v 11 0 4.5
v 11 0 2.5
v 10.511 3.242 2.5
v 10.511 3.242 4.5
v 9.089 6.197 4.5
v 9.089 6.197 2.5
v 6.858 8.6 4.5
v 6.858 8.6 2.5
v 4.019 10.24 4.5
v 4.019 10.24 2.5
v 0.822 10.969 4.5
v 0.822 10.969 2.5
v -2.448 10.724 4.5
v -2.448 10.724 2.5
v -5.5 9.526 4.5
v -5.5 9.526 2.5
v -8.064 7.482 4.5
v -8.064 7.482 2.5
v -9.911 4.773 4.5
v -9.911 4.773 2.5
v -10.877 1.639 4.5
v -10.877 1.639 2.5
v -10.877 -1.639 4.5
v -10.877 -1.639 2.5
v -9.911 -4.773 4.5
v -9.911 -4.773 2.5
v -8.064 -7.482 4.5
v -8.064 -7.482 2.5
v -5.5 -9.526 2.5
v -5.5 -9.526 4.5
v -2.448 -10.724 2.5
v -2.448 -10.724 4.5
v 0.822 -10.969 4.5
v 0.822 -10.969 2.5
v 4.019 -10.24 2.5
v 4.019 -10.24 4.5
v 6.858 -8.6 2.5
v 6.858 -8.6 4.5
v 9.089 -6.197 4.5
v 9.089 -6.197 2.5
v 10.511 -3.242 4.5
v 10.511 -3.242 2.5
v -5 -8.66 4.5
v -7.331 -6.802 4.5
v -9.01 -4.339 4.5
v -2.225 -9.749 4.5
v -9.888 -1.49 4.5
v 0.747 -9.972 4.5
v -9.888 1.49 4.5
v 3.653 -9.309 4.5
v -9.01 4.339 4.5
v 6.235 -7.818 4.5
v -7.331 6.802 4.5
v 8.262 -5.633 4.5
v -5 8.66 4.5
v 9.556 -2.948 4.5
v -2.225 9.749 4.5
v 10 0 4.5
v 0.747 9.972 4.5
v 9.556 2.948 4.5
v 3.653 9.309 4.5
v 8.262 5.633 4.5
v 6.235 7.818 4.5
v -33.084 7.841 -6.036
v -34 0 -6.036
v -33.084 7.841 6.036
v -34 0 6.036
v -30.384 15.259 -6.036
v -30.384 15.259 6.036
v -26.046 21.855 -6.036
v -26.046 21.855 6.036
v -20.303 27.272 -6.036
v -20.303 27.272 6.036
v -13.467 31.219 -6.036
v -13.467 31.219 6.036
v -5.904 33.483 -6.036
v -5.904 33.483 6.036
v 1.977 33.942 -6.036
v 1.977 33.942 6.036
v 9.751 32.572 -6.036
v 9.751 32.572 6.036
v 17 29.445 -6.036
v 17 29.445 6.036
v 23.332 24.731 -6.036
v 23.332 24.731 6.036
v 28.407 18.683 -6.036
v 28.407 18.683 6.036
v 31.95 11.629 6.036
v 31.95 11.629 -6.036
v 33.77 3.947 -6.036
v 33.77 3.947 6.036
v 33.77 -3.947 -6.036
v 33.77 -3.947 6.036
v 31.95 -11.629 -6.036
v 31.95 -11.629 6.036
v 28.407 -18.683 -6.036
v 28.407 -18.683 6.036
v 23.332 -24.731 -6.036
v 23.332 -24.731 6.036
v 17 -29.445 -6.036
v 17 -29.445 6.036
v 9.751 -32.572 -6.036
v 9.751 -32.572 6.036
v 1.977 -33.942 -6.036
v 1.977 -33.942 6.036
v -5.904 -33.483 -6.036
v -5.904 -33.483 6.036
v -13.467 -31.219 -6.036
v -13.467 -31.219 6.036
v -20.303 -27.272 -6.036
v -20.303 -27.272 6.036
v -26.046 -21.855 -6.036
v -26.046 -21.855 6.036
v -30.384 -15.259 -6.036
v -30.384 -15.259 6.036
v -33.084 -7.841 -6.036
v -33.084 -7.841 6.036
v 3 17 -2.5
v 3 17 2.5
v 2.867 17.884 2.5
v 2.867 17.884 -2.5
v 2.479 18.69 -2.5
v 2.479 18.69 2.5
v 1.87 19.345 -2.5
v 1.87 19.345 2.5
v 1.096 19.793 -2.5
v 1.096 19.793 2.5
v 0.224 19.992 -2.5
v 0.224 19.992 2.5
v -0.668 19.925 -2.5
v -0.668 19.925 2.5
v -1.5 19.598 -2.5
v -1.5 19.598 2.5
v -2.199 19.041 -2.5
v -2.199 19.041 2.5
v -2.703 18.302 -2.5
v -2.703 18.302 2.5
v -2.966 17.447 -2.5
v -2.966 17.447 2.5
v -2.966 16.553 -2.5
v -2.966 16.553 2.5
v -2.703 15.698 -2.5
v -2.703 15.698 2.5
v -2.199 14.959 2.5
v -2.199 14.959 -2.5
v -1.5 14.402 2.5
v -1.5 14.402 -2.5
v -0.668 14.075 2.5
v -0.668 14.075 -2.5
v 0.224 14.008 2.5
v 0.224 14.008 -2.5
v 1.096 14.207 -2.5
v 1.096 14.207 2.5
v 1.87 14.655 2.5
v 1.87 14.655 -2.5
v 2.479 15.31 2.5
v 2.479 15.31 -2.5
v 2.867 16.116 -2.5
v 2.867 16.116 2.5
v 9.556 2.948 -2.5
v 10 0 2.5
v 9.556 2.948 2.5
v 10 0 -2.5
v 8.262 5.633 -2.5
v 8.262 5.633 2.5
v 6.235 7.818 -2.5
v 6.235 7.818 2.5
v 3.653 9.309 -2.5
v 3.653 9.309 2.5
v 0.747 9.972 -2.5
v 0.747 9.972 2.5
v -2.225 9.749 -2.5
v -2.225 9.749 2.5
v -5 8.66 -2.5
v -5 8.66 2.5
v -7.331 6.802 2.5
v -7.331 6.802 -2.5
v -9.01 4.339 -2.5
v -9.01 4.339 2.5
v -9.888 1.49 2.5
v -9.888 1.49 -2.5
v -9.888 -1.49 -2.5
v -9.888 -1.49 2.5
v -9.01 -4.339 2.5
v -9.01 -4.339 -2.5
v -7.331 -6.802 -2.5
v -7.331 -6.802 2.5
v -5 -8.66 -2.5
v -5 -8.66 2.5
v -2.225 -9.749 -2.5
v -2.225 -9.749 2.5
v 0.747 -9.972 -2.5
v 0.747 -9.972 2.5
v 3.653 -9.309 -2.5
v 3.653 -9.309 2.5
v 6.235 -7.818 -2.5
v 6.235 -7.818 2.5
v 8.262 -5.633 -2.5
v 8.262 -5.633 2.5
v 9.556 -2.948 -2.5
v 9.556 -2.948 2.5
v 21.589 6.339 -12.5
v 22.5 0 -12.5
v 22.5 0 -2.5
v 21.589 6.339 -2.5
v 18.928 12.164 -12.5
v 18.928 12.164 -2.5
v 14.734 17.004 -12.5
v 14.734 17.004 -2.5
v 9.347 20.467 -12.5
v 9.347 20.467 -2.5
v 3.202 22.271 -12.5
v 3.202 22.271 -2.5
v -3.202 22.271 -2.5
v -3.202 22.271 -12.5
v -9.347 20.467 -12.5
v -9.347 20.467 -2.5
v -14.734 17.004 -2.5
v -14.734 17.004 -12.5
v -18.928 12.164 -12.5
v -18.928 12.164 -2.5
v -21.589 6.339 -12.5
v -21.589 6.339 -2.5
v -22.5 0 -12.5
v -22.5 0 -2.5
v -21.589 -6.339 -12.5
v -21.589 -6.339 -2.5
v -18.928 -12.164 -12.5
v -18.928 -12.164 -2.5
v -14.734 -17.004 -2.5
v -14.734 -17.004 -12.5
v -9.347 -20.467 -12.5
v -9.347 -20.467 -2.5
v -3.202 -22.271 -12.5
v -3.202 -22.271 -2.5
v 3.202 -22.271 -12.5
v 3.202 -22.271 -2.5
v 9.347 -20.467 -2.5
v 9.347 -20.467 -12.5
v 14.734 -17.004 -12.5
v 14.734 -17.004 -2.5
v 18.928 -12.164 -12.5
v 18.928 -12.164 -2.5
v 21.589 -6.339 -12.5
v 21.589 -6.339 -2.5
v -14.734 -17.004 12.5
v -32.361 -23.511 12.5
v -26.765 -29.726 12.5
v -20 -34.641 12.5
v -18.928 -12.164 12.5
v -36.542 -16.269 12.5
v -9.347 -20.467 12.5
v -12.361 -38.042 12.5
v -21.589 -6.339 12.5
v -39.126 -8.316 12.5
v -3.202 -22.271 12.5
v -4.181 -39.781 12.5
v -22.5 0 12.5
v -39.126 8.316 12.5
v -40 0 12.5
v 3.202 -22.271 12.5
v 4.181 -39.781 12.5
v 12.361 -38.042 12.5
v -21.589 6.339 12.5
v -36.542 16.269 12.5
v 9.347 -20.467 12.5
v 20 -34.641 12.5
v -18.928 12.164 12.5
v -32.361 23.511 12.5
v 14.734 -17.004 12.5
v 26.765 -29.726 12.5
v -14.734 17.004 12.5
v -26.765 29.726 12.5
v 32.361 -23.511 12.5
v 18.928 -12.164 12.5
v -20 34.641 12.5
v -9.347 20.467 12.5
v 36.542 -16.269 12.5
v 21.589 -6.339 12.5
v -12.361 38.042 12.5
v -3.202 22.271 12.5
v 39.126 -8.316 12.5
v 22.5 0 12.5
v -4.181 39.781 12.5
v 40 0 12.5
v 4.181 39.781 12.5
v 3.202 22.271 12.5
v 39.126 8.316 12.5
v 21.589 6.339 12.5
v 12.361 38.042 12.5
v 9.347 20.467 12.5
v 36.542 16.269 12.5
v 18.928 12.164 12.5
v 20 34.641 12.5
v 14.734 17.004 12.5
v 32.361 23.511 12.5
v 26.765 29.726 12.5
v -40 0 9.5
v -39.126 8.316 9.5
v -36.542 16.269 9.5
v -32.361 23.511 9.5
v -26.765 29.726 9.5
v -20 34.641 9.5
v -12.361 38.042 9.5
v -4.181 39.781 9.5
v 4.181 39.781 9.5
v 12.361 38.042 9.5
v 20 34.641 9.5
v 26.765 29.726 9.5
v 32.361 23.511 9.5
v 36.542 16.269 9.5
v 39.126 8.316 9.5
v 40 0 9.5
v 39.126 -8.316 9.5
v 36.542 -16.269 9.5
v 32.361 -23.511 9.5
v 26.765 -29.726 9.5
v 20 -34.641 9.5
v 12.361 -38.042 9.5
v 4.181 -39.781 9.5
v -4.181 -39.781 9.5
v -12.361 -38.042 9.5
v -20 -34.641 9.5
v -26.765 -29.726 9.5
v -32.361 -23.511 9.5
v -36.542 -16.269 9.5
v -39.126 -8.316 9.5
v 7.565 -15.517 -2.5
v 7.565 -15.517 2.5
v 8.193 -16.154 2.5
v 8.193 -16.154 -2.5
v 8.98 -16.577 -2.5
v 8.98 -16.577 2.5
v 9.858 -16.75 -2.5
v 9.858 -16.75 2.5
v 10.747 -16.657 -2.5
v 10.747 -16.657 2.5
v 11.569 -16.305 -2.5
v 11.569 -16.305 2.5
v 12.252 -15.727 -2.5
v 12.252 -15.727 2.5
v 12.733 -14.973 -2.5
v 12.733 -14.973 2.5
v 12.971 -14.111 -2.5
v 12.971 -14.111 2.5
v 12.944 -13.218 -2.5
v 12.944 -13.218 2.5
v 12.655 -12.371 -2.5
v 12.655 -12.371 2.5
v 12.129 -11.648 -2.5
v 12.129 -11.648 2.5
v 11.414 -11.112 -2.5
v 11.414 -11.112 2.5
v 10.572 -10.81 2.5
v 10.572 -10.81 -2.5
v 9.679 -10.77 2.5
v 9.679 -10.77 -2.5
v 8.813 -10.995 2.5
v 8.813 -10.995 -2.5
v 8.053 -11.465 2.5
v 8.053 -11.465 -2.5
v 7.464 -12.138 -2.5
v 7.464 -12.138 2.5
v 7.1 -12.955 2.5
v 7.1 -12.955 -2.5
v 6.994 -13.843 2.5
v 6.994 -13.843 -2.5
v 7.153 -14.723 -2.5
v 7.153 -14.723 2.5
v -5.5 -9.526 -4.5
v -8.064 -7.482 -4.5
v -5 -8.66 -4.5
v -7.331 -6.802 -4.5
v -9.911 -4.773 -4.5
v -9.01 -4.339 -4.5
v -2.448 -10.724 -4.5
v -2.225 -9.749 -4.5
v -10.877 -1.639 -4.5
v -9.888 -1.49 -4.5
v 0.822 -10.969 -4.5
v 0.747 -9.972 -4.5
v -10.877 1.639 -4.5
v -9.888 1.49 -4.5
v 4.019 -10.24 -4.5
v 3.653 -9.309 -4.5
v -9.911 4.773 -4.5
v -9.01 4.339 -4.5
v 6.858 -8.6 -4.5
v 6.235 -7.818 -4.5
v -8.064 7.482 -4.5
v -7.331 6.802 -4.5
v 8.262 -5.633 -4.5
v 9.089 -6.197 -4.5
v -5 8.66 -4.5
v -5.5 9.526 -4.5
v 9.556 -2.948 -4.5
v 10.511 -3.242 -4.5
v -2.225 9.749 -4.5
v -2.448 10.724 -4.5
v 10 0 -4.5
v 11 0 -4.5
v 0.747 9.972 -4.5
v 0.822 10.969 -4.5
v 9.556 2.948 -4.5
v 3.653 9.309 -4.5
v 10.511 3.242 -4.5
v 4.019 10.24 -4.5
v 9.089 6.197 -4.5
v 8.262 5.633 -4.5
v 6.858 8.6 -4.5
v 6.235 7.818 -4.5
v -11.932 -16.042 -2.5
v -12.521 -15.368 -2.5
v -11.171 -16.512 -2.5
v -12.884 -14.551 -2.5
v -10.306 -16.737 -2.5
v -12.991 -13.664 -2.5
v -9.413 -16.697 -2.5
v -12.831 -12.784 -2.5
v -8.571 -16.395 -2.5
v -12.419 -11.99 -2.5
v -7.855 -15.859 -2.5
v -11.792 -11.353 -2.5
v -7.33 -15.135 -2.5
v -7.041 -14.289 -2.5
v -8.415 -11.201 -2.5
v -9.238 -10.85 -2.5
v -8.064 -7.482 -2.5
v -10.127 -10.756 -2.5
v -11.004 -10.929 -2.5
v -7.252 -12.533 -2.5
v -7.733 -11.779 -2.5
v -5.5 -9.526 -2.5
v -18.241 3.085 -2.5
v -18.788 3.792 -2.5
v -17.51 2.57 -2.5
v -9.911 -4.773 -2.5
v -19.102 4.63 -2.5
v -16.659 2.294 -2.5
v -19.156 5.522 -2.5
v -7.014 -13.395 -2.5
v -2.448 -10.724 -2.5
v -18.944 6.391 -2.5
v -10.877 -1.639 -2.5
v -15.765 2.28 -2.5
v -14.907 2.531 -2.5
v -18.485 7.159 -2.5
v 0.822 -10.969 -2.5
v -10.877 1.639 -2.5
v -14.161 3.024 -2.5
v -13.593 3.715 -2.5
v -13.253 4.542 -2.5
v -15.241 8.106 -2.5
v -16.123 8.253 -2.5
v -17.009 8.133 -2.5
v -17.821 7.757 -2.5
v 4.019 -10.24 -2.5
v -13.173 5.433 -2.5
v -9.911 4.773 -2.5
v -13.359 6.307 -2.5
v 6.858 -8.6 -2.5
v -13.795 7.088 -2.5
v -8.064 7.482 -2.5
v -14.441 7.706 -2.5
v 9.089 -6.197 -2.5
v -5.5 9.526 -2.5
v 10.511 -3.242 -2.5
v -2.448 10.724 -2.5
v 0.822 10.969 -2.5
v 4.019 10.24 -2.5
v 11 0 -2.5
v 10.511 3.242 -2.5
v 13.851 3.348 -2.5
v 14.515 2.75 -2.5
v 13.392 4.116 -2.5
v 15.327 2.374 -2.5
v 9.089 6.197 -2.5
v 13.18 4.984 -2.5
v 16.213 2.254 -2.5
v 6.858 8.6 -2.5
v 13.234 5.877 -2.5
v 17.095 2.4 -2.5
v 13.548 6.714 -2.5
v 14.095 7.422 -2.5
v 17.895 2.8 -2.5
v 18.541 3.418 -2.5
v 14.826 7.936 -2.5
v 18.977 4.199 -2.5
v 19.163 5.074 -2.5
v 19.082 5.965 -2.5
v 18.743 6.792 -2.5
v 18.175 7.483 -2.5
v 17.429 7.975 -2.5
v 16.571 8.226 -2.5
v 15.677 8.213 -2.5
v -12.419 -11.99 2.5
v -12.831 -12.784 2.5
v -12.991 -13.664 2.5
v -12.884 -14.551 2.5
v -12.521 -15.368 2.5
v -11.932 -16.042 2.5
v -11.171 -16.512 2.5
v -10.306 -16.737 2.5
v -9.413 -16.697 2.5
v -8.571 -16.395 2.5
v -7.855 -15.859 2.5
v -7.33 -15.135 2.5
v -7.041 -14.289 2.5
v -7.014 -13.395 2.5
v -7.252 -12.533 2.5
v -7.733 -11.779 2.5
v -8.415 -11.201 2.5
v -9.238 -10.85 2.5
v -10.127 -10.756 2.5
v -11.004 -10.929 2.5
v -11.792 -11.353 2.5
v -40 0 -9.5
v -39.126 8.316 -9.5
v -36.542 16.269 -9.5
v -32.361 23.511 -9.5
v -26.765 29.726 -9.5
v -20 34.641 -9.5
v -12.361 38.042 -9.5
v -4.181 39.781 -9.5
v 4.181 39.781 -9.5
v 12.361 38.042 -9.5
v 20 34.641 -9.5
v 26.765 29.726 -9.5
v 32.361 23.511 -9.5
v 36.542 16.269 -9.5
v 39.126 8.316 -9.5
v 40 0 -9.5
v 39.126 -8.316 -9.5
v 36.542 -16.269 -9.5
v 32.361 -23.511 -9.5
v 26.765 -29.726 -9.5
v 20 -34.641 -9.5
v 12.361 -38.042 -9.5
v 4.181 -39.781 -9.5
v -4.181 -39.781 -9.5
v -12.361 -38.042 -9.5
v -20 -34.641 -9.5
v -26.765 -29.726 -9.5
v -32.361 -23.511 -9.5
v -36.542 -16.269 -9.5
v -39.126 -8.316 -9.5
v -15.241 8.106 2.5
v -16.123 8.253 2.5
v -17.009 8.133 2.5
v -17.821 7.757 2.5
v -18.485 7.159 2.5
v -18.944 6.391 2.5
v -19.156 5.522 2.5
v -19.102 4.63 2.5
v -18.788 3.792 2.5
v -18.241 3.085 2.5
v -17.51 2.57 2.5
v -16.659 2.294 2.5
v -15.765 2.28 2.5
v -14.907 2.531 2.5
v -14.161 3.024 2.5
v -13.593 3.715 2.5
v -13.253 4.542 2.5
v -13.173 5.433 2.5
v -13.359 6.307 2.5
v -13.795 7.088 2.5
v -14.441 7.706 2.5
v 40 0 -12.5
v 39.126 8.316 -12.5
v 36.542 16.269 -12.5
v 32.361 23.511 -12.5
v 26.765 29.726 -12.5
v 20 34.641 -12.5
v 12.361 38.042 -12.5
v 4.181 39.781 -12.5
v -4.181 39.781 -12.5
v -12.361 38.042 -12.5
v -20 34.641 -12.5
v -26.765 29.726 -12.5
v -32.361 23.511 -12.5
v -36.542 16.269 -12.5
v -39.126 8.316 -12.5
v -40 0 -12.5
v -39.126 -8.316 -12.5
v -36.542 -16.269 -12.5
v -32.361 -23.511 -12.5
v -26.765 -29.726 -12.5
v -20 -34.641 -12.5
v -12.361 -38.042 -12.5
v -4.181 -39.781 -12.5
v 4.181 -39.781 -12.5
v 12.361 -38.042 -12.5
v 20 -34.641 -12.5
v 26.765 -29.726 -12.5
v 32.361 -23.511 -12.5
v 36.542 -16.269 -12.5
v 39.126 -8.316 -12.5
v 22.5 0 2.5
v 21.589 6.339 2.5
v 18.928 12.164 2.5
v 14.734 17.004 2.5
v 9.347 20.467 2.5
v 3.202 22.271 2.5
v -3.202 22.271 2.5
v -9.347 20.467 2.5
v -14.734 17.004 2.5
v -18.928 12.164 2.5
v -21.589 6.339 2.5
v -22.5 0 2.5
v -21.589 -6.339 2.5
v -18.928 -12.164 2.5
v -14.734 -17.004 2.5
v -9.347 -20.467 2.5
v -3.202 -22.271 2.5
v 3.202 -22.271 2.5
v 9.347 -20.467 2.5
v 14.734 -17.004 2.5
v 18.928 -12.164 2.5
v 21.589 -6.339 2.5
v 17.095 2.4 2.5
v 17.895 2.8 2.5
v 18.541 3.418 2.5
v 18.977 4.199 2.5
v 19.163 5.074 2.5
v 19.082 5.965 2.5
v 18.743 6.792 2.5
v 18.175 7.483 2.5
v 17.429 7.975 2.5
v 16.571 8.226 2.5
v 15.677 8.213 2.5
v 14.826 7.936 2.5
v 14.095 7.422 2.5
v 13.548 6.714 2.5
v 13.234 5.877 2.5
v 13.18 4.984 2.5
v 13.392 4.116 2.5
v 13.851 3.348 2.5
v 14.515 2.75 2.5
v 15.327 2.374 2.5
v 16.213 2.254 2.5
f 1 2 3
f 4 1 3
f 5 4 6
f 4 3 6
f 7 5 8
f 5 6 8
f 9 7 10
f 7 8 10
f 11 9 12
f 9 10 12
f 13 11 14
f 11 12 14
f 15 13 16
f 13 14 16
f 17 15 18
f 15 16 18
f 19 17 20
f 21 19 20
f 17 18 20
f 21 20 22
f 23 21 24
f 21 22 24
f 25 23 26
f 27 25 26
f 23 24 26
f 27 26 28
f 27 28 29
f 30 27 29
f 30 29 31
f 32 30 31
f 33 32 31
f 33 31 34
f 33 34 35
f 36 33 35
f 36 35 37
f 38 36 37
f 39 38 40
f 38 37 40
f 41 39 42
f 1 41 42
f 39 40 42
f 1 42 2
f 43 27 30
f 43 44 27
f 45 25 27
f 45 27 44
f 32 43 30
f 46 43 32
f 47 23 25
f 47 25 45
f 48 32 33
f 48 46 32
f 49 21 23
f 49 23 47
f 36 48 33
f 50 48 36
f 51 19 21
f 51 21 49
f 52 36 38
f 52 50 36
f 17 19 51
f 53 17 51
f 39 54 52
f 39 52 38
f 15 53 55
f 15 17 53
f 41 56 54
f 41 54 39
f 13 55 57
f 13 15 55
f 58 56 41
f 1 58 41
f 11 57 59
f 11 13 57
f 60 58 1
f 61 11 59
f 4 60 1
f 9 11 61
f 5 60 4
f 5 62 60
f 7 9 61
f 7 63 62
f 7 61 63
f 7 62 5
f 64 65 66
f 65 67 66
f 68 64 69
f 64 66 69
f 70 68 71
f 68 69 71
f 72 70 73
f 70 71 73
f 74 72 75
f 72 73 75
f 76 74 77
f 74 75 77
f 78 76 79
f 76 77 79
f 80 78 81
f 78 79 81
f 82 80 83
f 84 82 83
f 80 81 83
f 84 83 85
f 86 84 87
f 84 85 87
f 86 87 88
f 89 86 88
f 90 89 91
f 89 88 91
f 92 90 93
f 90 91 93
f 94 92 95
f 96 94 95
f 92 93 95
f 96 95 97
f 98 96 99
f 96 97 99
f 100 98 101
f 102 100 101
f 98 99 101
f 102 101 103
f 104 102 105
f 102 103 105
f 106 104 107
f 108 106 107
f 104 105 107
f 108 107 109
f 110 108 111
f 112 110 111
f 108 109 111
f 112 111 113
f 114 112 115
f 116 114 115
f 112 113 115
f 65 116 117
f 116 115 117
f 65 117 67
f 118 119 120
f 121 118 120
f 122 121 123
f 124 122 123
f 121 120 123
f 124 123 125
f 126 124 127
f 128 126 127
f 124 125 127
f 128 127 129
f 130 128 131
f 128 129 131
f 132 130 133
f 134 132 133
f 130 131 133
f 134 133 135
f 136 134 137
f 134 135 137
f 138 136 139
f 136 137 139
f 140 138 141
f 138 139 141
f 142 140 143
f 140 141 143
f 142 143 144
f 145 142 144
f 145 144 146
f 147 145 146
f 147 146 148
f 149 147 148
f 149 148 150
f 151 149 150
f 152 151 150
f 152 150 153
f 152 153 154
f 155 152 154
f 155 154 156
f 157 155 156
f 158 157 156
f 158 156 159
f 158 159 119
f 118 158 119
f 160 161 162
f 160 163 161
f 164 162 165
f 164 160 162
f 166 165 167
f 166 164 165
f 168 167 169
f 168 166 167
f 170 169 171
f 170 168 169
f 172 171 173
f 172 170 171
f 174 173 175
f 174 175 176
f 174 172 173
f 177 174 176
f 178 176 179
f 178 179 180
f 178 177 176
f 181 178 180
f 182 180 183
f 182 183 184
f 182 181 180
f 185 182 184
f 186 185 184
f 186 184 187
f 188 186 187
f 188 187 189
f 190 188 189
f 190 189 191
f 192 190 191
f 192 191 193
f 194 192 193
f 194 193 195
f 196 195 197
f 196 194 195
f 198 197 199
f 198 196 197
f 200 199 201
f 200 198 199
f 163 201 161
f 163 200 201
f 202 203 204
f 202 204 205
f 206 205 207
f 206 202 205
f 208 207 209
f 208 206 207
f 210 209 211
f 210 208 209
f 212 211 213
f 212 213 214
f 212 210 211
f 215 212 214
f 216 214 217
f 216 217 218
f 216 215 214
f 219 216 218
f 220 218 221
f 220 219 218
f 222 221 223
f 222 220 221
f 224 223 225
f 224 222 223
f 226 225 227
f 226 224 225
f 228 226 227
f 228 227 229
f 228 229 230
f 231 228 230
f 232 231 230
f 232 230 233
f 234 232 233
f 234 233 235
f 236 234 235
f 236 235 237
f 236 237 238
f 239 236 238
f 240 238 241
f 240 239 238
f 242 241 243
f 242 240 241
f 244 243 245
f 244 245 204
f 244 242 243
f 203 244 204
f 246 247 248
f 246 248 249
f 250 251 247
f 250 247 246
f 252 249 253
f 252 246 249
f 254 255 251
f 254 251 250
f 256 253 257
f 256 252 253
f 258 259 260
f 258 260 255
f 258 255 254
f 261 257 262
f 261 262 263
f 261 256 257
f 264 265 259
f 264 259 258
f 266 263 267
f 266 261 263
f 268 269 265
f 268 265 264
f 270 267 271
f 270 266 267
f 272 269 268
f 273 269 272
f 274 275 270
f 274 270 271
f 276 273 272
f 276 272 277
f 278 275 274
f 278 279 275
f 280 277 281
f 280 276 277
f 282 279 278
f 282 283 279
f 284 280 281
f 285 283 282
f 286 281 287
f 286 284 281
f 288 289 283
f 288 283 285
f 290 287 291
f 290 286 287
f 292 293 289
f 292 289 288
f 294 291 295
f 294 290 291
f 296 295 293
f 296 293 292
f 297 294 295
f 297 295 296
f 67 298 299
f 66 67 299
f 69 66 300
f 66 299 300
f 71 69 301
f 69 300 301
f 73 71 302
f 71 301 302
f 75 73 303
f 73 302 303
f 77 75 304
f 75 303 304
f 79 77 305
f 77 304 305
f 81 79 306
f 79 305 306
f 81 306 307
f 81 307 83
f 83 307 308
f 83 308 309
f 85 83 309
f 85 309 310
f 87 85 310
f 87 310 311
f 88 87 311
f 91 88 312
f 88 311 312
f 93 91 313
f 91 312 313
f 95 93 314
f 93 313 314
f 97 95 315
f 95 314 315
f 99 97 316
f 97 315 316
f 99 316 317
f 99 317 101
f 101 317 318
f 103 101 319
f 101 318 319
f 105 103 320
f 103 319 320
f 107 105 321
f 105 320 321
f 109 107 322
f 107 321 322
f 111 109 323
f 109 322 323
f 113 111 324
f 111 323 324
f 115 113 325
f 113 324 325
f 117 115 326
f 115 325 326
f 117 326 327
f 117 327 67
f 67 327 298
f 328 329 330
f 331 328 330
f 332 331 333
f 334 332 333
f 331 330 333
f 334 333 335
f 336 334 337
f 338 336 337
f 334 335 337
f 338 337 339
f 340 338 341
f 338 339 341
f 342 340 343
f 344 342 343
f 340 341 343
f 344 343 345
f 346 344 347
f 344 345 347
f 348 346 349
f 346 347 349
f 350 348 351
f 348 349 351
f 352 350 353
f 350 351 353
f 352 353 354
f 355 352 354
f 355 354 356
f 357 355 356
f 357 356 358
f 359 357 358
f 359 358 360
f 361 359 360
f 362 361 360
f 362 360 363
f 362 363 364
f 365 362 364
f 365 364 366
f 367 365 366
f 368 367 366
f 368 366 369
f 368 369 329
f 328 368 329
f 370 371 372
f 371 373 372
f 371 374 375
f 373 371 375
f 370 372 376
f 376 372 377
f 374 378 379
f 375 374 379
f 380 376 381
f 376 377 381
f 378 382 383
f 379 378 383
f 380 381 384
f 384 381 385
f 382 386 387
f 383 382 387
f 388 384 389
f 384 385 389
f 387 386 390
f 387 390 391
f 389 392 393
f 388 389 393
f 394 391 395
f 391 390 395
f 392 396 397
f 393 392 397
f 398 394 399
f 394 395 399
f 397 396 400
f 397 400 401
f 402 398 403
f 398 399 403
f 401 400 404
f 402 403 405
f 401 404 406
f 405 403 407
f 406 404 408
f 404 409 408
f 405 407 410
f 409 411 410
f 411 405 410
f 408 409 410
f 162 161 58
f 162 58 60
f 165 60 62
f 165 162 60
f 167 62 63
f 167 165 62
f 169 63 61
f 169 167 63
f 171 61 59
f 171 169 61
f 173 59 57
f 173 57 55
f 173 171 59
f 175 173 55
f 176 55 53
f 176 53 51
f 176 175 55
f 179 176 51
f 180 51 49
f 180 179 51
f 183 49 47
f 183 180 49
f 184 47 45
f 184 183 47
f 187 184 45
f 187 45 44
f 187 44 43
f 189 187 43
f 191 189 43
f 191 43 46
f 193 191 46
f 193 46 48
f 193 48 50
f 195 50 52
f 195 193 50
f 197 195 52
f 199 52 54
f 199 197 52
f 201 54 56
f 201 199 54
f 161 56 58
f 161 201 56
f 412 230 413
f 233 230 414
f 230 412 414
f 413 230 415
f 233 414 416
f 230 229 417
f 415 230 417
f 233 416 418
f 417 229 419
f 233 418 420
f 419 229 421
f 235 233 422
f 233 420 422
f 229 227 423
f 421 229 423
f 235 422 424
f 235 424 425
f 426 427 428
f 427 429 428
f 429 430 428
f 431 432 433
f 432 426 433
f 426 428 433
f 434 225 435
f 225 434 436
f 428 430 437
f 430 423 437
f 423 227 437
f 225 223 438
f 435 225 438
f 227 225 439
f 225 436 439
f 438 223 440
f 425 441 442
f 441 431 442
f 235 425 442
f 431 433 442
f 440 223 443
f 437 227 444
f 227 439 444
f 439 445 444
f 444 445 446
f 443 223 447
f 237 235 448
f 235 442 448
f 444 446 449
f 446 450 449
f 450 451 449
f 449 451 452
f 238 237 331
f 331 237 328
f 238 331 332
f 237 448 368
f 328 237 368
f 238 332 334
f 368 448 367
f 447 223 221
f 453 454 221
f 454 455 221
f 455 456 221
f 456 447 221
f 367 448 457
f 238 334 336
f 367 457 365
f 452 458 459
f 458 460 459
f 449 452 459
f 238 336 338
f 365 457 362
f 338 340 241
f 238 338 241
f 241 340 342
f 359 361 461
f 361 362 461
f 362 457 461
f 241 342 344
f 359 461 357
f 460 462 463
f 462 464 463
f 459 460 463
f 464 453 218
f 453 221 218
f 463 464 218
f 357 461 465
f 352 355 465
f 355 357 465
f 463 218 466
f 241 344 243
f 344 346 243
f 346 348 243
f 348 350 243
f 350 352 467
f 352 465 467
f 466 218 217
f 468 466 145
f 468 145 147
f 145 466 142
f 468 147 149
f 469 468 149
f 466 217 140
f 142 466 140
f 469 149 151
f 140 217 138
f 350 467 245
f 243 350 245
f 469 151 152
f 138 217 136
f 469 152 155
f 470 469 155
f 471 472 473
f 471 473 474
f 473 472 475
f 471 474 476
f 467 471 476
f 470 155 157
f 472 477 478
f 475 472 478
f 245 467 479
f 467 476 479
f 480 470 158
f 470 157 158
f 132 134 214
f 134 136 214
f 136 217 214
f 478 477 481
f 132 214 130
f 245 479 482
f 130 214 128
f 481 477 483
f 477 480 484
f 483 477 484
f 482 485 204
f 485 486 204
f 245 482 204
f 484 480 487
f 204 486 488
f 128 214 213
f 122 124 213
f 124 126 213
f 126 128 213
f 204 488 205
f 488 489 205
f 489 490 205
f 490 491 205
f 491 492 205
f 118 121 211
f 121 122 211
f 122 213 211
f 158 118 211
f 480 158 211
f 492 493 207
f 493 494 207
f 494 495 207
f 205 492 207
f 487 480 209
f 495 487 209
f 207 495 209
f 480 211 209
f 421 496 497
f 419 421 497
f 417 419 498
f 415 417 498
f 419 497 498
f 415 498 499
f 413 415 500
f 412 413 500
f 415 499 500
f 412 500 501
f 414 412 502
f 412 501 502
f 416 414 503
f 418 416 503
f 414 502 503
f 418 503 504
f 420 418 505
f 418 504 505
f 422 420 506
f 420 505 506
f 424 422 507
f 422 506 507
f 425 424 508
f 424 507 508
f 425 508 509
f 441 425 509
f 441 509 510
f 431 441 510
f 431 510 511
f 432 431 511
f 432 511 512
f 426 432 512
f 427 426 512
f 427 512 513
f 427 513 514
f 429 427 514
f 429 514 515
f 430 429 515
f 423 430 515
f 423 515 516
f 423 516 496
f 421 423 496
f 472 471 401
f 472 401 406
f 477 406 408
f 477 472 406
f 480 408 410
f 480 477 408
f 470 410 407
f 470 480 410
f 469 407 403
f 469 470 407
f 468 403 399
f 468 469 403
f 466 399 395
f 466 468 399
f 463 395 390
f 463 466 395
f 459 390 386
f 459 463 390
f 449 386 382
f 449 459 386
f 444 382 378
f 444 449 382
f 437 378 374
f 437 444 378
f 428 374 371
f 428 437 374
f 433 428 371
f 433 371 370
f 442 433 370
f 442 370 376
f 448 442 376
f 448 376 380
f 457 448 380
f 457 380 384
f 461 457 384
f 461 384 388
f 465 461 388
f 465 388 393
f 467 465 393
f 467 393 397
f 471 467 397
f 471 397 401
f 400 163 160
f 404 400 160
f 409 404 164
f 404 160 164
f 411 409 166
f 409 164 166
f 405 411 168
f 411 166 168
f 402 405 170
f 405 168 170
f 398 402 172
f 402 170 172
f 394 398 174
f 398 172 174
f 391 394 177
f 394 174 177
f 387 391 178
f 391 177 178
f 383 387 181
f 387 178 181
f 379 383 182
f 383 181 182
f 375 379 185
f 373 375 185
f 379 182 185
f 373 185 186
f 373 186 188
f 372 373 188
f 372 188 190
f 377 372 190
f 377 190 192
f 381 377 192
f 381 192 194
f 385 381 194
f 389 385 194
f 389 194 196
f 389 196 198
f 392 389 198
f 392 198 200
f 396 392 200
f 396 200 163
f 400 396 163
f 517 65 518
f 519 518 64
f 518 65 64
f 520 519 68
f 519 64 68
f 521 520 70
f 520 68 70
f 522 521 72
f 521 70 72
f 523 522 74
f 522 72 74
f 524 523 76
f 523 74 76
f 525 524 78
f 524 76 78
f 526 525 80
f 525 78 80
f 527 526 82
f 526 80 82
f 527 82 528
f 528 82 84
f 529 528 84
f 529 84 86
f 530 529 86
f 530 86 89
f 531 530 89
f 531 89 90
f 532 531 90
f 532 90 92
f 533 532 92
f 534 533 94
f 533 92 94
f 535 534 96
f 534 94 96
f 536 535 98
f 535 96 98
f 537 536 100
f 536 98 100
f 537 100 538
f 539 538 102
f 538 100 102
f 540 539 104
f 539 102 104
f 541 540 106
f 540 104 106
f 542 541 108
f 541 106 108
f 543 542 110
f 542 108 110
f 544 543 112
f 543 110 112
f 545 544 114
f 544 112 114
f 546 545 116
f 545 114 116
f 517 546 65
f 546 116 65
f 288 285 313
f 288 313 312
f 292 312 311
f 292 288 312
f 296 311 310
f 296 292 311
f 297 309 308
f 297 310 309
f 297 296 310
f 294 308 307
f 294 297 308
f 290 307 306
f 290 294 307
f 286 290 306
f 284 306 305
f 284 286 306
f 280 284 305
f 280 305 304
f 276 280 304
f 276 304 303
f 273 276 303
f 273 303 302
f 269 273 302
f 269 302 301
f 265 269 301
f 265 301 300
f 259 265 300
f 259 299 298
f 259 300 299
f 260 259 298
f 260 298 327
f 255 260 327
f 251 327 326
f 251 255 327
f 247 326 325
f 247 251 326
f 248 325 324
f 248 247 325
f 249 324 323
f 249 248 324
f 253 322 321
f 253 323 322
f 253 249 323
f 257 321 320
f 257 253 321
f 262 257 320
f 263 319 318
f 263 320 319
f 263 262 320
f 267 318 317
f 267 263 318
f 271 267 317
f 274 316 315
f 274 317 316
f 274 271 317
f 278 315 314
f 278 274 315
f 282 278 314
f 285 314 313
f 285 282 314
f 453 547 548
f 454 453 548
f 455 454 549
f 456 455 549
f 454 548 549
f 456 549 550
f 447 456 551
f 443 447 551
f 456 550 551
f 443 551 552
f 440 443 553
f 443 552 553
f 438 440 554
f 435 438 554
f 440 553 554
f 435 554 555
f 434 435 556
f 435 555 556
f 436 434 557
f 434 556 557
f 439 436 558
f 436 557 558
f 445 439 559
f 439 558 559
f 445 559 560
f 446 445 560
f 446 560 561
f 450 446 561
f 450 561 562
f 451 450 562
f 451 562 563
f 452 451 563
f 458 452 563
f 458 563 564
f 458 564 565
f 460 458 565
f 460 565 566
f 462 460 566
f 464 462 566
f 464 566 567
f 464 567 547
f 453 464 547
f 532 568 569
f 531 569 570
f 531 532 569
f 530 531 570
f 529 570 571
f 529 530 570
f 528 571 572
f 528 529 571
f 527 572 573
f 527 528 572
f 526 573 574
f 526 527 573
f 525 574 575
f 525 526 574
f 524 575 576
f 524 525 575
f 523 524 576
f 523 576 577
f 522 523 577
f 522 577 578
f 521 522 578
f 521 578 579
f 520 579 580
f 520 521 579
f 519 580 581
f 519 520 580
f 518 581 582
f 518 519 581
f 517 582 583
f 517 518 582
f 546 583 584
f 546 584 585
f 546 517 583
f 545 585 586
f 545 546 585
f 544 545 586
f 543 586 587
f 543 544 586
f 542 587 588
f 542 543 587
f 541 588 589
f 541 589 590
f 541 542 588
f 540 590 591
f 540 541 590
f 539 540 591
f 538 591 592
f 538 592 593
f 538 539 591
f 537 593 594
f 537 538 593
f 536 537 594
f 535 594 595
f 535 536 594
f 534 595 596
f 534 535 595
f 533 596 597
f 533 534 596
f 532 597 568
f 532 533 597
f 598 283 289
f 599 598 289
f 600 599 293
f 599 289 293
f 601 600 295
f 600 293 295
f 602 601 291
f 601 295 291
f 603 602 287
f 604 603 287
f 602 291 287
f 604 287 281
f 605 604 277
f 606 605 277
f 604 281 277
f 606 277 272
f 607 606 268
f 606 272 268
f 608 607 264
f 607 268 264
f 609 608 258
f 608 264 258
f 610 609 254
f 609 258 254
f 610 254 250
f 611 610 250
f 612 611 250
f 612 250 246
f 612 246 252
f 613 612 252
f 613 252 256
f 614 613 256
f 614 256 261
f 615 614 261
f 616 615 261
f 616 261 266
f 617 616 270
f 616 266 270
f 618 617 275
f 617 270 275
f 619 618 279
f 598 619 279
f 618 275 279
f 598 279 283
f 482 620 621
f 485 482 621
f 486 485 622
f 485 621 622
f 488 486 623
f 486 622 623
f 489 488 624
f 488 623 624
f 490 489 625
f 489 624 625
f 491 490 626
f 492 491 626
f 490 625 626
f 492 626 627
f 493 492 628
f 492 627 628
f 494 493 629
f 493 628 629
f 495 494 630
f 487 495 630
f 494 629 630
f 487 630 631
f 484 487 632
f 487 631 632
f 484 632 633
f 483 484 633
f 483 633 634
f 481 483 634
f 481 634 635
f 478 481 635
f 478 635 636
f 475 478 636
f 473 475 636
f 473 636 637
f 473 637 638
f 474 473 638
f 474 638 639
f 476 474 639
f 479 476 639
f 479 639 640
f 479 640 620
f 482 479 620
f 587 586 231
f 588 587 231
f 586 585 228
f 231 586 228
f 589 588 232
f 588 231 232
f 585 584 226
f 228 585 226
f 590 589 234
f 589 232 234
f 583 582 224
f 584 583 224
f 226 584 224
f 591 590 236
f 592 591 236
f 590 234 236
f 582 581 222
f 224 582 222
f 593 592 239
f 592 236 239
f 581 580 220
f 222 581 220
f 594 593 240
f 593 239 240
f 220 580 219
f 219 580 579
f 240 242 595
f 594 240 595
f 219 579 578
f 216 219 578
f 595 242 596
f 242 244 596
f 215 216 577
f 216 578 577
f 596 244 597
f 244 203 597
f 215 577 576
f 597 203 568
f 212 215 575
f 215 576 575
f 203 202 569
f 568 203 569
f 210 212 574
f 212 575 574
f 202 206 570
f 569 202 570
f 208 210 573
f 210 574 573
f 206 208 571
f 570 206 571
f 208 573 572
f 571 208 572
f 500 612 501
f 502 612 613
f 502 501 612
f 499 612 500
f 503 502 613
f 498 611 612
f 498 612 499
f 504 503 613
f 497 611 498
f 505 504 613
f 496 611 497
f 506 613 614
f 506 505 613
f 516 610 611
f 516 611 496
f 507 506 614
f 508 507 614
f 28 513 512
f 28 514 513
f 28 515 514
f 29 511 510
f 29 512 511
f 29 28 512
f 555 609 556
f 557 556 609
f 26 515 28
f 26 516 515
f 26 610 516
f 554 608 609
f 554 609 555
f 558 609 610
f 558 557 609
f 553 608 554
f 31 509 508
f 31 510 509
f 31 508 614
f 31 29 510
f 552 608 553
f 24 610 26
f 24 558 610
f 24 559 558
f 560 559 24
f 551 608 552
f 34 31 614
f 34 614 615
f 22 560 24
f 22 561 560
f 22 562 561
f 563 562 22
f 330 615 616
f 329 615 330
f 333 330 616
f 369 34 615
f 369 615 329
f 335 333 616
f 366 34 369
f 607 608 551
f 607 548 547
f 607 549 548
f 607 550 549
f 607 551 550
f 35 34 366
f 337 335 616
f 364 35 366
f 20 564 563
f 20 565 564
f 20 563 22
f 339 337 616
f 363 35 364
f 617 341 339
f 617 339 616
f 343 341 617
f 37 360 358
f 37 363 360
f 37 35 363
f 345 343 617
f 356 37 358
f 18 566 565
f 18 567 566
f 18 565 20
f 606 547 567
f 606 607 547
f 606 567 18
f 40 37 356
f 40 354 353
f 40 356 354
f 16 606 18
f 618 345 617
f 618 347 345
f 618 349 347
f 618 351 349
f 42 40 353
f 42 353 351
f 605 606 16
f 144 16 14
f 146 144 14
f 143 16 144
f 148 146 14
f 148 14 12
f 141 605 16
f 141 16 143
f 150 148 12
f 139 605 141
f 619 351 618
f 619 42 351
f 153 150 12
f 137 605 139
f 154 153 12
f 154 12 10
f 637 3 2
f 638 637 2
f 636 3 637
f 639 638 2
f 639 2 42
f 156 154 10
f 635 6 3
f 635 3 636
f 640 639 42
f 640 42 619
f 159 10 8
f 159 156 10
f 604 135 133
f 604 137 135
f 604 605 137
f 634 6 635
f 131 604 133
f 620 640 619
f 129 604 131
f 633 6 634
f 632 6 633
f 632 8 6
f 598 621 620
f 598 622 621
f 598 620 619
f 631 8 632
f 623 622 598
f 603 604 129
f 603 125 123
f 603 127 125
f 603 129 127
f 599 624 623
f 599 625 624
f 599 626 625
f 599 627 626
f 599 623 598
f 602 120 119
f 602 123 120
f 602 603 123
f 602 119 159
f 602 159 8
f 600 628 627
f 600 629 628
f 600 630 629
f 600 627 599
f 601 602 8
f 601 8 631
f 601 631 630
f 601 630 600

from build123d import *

# Parameters (mm, degrees)
SKETCH1_R                = 40
SKETCH1_R_2              = 10
BOSS_EXTRUDE1_DEPTH      = 12.5
SKETCH2_R                = 22.5
CUT_EXTRUDE1_DEPTH       = 10
SKETCH3_R                = 3
CUT_EXTRUDE2_DEPTH       = 16
CIRPATTERN1_COUNT        = 5
SKETCH4_R                = 11
SKETCH4_R_2              = 10
BOSS_EXTRUDE2_DEPTH      = 2
BOSS_EXTRUDE2_DEPTH_BACK = 7


with BuildPart() as part:
    # Sketch1 → Boss-Extrude1 (new body, symmetric)
    with BuildSketch(Plane.XY):
        Circle(SKETCH1_R)
        Circle(SKETCH1_R_2, mode=Mode.SUBTRACT)
    extrude(amount=BOSS_EXTRUDE1_DEPTH, both=True)

    # Sketch2 → Cut-Extrude1 (cut)
    with BuildSketch(Plane.XY.offset(12.5)):
        Circle(SKETCH2_R)
    cut_extrude1 = extrude(amount=-CUT_EXTRUDE1_DEPTH, mode=Mode.SUBTRACT)

    # Mirror1: Cut-Extrude1 across plane
    add(cut_extrude1.mirror(Plane.XY), mode=Mode.SUBTRACT)

    # Sketch3 → Cut-Extrude2 (cut, through all)
    with BuildSketch(Plane.XY.offset(2.5)):
        with Locations((0, 17)):
            Circle(SKETCH3_R)
    cut_extrude2 = extrude(amount=-CUT_EXTRUDE2_DEPTH, mode=Mode.SUBTRACT)

    # CirPattern1: Cut-Extrude2 ×5 about axis
    cirpattern1_axis = Axis((0, 0, 0), (0, 0, 1))
    for i in range(1, CIRPATTERN1_COUNT):
        add(cut_extrude2.rotate(cirpattern1_axis, i * 360 / CIRPATTERN1_COUNT), mode=Mode.SUBTRACT)

    # Sketch4 → Boss-Extrude2 (add, two sides)
    with BuildSketch(Plane.XY.offset(2.5)) as boss_extrude2_sk:
        Circle(SKETCH4_R)
        Circle(SKETCH4_R_2, mode=Mode.SUBTRACT)
    extrude(amount=BOSS_EXTRUDE2_DEPTH)
    extrude(boss_extrude2_sk.sketch, amount=-BOSS_EXTRUDE2_DEPTH_BACK)

    # Sketch5 → Cut-Revolve1 (revolve, cut)
    with BuildSketch(Plane(origin=(0, 0, 0), x_dir=(1, 0, 0), z_dir=(0, 1, 0))):
        Polygon((-40, 9.5), (-34, 6.035898385), (-34, -6.035898385), (-40, -9.5), align=None)
    revolve(axis=Axis((0, 0, 0), (0, 0, -1)), mode=Mode.SUBTRACT)


solid = part.part
